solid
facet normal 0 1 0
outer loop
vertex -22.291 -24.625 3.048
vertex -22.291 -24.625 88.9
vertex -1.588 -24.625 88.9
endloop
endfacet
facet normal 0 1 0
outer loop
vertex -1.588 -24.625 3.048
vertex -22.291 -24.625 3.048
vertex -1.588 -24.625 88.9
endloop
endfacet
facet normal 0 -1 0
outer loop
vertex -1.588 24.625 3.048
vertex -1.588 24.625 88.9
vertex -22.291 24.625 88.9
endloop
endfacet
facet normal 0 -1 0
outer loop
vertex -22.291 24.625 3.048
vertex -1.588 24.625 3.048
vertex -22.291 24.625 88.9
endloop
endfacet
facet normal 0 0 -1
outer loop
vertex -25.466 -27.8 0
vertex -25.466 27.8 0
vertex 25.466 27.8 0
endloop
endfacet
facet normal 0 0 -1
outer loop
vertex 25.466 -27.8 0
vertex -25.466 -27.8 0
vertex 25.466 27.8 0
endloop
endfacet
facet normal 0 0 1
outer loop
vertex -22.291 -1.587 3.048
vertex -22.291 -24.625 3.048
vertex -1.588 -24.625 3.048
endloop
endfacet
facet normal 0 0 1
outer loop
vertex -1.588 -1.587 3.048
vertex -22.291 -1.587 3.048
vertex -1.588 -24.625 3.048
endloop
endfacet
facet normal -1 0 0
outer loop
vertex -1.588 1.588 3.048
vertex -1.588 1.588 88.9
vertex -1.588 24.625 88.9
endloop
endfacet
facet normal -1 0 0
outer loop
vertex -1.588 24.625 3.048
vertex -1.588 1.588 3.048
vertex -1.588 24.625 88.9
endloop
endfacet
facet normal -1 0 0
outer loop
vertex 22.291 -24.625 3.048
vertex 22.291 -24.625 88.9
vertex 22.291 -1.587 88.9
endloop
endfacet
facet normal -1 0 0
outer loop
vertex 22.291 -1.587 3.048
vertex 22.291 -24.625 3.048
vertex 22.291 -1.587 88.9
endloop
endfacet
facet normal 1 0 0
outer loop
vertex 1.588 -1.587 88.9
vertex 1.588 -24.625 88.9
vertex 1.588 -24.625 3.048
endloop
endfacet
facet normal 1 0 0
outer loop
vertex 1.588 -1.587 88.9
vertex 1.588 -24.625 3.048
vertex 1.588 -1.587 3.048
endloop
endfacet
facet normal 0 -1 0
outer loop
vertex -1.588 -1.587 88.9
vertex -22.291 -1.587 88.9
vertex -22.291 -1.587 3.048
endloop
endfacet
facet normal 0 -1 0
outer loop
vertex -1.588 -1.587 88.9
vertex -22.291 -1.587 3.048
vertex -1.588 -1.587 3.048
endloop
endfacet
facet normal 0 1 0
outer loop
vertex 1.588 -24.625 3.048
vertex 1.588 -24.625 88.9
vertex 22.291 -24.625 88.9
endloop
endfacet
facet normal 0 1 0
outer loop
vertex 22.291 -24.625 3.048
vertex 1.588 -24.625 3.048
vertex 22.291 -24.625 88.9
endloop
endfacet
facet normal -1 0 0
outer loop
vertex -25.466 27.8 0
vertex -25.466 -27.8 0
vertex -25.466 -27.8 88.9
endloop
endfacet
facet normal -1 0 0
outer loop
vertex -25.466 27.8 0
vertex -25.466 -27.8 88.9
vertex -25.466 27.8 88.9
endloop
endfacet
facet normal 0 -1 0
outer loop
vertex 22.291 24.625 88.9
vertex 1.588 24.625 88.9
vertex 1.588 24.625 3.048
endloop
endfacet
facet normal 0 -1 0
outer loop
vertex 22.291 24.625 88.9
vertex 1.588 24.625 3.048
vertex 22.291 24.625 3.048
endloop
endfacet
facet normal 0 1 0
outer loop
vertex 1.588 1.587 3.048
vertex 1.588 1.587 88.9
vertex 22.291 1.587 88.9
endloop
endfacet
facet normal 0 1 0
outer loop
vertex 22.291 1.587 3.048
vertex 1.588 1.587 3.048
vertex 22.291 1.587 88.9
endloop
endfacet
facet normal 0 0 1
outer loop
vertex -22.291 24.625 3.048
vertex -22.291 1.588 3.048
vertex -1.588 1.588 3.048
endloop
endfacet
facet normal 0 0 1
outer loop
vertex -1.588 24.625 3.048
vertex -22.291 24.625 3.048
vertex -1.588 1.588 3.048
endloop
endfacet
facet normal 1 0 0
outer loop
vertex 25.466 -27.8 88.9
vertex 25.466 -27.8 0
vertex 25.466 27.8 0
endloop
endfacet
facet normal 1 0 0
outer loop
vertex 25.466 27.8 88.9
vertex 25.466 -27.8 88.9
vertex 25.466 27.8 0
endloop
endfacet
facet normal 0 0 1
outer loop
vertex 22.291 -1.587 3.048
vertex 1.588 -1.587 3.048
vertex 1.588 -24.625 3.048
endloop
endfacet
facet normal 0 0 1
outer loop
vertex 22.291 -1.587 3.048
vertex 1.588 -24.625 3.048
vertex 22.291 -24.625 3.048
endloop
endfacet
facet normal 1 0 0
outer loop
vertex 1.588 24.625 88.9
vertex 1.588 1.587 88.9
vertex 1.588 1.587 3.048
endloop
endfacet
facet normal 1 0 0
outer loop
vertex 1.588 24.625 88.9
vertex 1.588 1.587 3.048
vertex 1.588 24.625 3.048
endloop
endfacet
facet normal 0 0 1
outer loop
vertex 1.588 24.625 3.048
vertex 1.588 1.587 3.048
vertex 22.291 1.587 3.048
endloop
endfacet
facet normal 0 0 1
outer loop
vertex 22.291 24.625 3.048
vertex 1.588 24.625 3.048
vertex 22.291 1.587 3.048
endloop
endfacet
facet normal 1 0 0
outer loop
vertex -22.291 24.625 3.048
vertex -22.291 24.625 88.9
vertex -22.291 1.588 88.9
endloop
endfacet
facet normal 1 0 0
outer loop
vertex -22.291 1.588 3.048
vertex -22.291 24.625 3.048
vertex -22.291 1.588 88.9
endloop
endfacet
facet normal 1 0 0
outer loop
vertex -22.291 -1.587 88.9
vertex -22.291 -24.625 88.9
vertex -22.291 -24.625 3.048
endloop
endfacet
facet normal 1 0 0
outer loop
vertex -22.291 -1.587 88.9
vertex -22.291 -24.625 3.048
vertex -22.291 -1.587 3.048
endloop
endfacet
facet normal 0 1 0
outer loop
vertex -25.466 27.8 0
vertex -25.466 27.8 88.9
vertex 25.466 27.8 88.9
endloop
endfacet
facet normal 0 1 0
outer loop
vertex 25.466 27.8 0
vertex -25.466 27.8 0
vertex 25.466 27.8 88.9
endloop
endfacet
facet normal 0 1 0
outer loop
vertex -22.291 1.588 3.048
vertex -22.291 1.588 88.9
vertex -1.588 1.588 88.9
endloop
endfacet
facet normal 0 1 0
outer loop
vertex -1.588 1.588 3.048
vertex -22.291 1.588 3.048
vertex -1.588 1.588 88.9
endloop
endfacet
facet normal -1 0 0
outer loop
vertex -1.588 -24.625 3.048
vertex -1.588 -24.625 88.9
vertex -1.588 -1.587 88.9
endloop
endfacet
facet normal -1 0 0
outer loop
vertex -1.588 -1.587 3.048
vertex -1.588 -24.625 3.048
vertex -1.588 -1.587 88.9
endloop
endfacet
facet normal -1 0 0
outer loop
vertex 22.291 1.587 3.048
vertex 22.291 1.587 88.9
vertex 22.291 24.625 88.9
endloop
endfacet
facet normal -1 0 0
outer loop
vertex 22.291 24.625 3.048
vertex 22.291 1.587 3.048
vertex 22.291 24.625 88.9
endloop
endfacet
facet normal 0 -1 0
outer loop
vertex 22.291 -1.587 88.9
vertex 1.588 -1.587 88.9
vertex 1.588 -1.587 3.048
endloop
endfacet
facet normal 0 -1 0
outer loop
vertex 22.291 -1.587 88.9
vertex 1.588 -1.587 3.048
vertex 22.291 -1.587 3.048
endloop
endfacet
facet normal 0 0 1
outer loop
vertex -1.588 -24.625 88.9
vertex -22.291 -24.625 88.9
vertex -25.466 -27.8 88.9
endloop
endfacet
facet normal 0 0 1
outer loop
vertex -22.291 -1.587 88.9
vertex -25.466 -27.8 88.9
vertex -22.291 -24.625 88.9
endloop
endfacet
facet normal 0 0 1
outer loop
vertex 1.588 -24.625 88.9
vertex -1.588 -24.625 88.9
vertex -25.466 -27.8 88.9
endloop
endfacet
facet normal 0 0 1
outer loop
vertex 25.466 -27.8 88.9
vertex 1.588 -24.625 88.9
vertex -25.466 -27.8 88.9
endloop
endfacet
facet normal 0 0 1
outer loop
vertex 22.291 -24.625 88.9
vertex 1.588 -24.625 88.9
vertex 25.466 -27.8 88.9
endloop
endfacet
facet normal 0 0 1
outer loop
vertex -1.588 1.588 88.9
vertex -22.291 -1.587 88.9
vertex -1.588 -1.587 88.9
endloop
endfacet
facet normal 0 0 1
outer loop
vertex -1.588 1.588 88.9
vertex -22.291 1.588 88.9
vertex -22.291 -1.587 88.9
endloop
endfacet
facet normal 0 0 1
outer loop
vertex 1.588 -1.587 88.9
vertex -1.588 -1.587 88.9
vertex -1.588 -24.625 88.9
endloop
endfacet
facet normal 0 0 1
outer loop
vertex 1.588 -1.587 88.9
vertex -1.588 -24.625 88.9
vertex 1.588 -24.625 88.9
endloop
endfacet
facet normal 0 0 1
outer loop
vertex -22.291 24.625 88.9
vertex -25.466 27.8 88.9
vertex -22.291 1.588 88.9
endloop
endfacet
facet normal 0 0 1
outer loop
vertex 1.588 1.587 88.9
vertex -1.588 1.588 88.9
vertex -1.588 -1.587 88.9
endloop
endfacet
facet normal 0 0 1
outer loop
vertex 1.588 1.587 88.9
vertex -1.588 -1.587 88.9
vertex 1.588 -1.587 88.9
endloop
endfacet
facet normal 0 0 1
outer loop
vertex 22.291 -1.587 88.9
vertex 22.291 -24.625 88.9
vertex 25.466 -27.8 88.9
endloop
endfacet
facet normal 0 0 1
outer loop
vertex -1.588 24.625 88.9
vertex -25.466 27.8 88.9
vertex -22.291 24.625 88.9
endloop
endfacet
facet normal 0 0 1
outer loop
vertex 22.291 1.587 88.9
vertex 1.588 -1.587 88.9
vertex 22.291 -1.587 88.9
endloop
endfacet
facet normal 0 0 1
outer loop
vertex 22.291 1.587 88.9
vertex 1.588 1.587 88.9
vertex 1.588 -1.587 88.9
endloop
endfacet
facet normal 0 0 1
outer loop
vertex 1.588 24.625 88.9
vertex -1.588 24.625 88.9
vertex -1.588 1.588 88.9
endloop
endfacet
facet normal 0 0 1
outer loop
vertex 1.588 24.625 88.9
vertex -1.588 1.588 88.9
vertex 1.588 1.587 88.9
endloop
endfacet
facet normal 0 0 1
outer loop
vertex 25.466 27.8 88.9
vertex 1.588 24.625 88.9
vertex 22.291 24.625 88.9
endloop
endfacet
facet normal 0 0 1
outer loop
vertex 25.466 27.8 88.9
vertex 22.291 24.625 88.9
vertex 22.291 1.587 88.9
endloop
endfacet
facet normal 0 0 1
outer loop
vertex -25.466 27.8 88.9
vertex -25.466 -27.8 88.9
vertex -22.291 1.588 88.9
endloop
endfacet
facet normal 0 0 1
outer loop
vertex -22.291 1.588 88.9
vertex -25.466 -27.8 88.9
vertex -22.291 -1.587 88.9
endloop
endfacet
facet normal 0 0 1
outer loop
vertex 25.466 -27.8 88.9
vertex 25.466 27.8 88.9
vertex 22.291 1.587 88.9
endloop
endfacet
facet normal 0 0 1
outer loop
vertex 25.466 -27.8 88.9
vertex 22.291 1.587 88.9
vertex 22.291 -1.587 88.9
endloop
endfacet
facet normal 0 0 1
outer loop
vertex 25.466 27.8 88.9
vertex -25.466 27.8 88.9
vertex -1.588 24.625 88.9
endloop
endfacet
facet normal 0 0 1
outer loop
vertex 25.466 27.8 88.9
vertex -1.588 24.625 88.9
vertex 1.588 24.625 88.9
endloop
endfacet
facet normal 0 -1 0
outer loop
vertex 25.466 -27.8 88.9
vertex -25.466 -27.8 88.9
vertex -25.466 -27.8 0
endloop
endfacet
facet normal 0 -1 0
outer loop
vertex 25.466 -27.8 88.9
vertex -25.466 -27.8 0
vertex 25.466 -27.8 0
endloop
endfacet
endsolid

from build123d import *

# Parameters (mm, degrees)
F0_W     = 50.931696
F0_H     = 55.600882
F1_DEPTH = 88.9
F2_W     = 20.703348
F2_H     = 23.037941
F3_DEPTH = 85.852


with BuildPart() as f1:
    # F0 (on Top) → F1 (new body)
    with BuildSketch(Plane.XY):
        Rectangle(F0_W, F0_H)
    extrude(amount=F1_DEPTH)

    # F2 (on face) → F3 (cut)
    with BuildSketch(Plane.XY.offset(88.9)):
        Polygon((-22.290848, 23.611975), (-22.290848, 1.5875), (-1.5875, 1.5875), (-1.5875, 24.625441), (-20.838022, 24.625441), (-22.290848, 24.625441), align=None)
        with Locations((-11.939174, -13.10647)):
            Rectangle(F2_W, F2_H)
        with Locations((11.939174, -13.10647)):
            Rectangle(F2_W, F2_H)
        with Locations((11.939174, 13.10647)):
            Rectangle(F2_W, F2_H)
    extrude(amount=-F3_DEPTH, mode=Mode.SUBTRACT)


solid = f1.part
